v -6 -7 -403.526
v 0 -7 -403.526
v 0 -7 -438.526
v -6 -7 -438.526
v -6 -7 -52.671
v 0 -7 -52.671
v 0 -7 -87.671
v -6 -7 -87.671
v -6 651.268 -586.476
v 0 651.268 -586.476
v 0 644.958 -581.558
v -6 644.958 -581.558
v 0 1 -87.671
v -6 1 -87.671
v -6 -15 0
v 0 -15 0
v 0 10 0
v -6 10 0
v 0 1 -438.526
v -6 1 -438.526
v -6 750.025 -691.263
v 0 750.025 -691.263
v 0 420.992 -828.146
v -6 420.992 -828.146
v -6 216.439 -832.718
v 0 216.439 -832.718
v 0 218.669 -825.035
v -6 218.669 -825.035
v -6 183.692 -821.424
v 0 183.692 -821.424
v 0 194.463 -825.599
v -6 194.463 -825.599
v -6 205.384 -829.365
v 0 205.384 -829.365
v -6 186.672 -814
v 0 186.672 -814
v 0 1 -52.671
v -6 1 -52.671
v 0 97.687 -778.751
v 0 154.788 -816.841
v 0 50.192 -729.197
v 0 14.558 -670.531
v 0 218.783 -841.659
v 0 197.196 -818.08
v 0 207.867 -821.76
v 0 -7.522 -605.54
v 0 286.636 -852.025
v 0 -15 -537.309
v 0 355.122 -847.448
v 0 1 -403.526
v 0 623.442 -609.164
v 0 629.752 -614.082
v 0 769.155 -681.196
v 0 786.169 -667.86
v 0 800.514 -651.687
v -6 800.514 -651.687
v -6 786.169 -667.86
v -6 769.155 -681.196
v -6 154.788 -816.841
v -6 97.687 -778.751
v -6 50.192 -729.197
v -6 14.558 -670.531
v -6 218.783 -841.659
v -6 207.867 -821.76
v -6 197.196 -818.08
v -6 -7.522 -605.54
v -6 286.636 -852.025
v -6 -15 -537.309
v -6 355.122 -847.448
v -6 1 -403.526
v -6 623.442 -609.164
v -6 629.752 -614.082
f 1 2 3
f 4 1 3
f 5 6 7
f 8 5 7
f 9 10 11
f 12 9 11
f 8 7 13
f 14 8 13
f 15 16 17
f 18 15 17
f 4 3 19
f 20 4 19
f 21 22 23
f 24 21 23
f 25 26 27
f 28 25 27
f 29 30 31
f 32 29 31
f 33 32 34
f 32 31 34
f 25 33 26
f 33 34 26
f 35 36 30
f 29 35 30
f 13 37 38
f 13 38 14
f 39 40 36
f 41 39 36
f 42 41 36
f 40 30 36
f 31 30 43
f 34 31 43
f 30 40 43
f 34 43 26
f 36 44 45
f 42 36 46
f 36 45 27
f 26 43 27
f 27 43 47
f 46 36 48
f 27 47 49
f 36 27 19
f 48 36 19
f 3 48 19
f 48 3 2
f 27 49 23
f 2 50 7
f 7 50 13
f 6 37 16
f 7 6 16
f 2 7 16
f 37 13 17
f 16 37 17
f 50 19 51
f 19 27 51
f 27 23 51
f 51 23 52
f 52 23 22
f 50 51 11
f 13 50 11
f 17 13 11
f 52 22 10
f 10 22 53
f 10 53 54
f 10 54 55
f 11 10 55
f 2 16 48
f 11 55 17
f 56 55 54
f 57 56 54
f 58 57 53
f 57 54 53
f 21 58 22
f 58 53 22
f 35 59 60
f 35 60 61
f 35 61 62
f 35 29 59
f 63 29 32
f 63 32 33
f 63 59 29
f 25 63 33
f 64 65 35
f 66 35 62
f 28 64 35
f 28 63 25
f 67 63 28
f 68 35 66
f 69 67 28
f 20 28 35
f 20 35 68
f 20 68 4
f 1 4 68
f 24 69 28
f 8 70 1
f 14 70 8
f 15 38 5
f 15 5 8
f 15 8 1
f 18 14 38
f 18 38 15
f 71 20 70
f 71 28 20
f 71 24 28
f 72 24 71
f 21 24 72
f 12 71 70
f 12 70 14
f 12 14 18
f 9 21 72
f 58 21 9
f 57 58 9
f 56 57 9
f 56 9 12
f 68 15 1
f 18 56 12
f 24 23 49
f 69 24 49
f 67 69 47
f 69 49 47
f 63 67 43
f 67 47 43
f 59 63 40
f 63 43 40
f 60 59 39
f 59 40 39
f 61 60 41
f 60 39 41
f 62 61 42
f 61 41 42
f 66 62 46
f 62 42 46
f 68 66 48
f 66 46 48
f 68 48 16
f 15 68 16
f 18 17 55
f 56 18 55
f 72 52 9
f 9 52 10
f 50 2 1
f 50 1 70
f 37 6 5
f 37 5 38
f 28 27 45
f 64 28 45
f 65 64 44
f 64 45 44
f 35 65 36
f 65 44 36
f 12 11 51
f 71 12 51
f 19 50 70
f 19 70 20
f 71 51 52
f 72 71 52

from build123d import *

# Parameters (mm, degrees)
BASE_FLANGE1_DEPTH = 6
SKETCH3_W          = 35
SKETCH3_H          = 8
CUT_EXTRUDE2_DEPTH = 6


# Sheet-metal steps are written as plain solids
with BuildPart() as part:
    # Sketch1 → Base-Flange1 (new body)
    with BuildSketch(Plane(origin=(0, 0, 0), x_dir=(0, 0, -1), z_dir=(1, 0, 0))):
        with BuildLine():
            Line((691.263386145, 750.024971585), (828.145509118, 420.991908823))
            ThreePointArc((828.145509118, 420.991908823), (799.356039458, 125.196469257), (537.308857372, -15))
            Line((537.308857372, -15), (0, -15))
            Line((0, -15), (0, 10))
            Line((0, 10), (651.687076161, 800.513923243))
            ThreePointArc((651.687076161, 800.513923243), (674.911649445, 777.963121002), (691.263386145, 750.024971585))
        make_face()
    extrude(amount=-BASE_FLANGE1_DEPTH)

    # Sketch3 → Cut-Extrude2 (cut)
    with BuildSketch(Plane(origin=(0, 0, 0), x_dir=(0, 0, -1), z_dir=(1, 0, 0))):
        with BuildLine():
            Line((832.717916058, 216.438716825), (825.035135409, 218.669161062))
            ThreePointArc((825.035135409, 218.669161062), (819.970515176, 202.5140849), (813.999628283, 186.671566993))
            Line((813.999628283, 186.671566993), (821.42397234, 183.691782549))
            ThreePointArc((821.42397234, 183.691782549), (827.533179903, 199.905831283), (832.717916058, 216.438716825))
        make_face()
        with Locations((70.170932866, -3)):
            Rectangle(SKETCH3_W, SKETCH3_H)
        with Locations((421.025597194, -3)):
            Rectangle(SKETCH3_W, SKETCH3_H)
        Polygon((581.55788083, 644.957729578), (609.163726943, 623.44221749), (614.081558277, 629.752125173), (586.475712165, 651.267637261), align=None)
    extrude(amount=-CUT_EXTRUDE2_DEPTH, mode=Mode.SUBTRACT)


solid = part.part
